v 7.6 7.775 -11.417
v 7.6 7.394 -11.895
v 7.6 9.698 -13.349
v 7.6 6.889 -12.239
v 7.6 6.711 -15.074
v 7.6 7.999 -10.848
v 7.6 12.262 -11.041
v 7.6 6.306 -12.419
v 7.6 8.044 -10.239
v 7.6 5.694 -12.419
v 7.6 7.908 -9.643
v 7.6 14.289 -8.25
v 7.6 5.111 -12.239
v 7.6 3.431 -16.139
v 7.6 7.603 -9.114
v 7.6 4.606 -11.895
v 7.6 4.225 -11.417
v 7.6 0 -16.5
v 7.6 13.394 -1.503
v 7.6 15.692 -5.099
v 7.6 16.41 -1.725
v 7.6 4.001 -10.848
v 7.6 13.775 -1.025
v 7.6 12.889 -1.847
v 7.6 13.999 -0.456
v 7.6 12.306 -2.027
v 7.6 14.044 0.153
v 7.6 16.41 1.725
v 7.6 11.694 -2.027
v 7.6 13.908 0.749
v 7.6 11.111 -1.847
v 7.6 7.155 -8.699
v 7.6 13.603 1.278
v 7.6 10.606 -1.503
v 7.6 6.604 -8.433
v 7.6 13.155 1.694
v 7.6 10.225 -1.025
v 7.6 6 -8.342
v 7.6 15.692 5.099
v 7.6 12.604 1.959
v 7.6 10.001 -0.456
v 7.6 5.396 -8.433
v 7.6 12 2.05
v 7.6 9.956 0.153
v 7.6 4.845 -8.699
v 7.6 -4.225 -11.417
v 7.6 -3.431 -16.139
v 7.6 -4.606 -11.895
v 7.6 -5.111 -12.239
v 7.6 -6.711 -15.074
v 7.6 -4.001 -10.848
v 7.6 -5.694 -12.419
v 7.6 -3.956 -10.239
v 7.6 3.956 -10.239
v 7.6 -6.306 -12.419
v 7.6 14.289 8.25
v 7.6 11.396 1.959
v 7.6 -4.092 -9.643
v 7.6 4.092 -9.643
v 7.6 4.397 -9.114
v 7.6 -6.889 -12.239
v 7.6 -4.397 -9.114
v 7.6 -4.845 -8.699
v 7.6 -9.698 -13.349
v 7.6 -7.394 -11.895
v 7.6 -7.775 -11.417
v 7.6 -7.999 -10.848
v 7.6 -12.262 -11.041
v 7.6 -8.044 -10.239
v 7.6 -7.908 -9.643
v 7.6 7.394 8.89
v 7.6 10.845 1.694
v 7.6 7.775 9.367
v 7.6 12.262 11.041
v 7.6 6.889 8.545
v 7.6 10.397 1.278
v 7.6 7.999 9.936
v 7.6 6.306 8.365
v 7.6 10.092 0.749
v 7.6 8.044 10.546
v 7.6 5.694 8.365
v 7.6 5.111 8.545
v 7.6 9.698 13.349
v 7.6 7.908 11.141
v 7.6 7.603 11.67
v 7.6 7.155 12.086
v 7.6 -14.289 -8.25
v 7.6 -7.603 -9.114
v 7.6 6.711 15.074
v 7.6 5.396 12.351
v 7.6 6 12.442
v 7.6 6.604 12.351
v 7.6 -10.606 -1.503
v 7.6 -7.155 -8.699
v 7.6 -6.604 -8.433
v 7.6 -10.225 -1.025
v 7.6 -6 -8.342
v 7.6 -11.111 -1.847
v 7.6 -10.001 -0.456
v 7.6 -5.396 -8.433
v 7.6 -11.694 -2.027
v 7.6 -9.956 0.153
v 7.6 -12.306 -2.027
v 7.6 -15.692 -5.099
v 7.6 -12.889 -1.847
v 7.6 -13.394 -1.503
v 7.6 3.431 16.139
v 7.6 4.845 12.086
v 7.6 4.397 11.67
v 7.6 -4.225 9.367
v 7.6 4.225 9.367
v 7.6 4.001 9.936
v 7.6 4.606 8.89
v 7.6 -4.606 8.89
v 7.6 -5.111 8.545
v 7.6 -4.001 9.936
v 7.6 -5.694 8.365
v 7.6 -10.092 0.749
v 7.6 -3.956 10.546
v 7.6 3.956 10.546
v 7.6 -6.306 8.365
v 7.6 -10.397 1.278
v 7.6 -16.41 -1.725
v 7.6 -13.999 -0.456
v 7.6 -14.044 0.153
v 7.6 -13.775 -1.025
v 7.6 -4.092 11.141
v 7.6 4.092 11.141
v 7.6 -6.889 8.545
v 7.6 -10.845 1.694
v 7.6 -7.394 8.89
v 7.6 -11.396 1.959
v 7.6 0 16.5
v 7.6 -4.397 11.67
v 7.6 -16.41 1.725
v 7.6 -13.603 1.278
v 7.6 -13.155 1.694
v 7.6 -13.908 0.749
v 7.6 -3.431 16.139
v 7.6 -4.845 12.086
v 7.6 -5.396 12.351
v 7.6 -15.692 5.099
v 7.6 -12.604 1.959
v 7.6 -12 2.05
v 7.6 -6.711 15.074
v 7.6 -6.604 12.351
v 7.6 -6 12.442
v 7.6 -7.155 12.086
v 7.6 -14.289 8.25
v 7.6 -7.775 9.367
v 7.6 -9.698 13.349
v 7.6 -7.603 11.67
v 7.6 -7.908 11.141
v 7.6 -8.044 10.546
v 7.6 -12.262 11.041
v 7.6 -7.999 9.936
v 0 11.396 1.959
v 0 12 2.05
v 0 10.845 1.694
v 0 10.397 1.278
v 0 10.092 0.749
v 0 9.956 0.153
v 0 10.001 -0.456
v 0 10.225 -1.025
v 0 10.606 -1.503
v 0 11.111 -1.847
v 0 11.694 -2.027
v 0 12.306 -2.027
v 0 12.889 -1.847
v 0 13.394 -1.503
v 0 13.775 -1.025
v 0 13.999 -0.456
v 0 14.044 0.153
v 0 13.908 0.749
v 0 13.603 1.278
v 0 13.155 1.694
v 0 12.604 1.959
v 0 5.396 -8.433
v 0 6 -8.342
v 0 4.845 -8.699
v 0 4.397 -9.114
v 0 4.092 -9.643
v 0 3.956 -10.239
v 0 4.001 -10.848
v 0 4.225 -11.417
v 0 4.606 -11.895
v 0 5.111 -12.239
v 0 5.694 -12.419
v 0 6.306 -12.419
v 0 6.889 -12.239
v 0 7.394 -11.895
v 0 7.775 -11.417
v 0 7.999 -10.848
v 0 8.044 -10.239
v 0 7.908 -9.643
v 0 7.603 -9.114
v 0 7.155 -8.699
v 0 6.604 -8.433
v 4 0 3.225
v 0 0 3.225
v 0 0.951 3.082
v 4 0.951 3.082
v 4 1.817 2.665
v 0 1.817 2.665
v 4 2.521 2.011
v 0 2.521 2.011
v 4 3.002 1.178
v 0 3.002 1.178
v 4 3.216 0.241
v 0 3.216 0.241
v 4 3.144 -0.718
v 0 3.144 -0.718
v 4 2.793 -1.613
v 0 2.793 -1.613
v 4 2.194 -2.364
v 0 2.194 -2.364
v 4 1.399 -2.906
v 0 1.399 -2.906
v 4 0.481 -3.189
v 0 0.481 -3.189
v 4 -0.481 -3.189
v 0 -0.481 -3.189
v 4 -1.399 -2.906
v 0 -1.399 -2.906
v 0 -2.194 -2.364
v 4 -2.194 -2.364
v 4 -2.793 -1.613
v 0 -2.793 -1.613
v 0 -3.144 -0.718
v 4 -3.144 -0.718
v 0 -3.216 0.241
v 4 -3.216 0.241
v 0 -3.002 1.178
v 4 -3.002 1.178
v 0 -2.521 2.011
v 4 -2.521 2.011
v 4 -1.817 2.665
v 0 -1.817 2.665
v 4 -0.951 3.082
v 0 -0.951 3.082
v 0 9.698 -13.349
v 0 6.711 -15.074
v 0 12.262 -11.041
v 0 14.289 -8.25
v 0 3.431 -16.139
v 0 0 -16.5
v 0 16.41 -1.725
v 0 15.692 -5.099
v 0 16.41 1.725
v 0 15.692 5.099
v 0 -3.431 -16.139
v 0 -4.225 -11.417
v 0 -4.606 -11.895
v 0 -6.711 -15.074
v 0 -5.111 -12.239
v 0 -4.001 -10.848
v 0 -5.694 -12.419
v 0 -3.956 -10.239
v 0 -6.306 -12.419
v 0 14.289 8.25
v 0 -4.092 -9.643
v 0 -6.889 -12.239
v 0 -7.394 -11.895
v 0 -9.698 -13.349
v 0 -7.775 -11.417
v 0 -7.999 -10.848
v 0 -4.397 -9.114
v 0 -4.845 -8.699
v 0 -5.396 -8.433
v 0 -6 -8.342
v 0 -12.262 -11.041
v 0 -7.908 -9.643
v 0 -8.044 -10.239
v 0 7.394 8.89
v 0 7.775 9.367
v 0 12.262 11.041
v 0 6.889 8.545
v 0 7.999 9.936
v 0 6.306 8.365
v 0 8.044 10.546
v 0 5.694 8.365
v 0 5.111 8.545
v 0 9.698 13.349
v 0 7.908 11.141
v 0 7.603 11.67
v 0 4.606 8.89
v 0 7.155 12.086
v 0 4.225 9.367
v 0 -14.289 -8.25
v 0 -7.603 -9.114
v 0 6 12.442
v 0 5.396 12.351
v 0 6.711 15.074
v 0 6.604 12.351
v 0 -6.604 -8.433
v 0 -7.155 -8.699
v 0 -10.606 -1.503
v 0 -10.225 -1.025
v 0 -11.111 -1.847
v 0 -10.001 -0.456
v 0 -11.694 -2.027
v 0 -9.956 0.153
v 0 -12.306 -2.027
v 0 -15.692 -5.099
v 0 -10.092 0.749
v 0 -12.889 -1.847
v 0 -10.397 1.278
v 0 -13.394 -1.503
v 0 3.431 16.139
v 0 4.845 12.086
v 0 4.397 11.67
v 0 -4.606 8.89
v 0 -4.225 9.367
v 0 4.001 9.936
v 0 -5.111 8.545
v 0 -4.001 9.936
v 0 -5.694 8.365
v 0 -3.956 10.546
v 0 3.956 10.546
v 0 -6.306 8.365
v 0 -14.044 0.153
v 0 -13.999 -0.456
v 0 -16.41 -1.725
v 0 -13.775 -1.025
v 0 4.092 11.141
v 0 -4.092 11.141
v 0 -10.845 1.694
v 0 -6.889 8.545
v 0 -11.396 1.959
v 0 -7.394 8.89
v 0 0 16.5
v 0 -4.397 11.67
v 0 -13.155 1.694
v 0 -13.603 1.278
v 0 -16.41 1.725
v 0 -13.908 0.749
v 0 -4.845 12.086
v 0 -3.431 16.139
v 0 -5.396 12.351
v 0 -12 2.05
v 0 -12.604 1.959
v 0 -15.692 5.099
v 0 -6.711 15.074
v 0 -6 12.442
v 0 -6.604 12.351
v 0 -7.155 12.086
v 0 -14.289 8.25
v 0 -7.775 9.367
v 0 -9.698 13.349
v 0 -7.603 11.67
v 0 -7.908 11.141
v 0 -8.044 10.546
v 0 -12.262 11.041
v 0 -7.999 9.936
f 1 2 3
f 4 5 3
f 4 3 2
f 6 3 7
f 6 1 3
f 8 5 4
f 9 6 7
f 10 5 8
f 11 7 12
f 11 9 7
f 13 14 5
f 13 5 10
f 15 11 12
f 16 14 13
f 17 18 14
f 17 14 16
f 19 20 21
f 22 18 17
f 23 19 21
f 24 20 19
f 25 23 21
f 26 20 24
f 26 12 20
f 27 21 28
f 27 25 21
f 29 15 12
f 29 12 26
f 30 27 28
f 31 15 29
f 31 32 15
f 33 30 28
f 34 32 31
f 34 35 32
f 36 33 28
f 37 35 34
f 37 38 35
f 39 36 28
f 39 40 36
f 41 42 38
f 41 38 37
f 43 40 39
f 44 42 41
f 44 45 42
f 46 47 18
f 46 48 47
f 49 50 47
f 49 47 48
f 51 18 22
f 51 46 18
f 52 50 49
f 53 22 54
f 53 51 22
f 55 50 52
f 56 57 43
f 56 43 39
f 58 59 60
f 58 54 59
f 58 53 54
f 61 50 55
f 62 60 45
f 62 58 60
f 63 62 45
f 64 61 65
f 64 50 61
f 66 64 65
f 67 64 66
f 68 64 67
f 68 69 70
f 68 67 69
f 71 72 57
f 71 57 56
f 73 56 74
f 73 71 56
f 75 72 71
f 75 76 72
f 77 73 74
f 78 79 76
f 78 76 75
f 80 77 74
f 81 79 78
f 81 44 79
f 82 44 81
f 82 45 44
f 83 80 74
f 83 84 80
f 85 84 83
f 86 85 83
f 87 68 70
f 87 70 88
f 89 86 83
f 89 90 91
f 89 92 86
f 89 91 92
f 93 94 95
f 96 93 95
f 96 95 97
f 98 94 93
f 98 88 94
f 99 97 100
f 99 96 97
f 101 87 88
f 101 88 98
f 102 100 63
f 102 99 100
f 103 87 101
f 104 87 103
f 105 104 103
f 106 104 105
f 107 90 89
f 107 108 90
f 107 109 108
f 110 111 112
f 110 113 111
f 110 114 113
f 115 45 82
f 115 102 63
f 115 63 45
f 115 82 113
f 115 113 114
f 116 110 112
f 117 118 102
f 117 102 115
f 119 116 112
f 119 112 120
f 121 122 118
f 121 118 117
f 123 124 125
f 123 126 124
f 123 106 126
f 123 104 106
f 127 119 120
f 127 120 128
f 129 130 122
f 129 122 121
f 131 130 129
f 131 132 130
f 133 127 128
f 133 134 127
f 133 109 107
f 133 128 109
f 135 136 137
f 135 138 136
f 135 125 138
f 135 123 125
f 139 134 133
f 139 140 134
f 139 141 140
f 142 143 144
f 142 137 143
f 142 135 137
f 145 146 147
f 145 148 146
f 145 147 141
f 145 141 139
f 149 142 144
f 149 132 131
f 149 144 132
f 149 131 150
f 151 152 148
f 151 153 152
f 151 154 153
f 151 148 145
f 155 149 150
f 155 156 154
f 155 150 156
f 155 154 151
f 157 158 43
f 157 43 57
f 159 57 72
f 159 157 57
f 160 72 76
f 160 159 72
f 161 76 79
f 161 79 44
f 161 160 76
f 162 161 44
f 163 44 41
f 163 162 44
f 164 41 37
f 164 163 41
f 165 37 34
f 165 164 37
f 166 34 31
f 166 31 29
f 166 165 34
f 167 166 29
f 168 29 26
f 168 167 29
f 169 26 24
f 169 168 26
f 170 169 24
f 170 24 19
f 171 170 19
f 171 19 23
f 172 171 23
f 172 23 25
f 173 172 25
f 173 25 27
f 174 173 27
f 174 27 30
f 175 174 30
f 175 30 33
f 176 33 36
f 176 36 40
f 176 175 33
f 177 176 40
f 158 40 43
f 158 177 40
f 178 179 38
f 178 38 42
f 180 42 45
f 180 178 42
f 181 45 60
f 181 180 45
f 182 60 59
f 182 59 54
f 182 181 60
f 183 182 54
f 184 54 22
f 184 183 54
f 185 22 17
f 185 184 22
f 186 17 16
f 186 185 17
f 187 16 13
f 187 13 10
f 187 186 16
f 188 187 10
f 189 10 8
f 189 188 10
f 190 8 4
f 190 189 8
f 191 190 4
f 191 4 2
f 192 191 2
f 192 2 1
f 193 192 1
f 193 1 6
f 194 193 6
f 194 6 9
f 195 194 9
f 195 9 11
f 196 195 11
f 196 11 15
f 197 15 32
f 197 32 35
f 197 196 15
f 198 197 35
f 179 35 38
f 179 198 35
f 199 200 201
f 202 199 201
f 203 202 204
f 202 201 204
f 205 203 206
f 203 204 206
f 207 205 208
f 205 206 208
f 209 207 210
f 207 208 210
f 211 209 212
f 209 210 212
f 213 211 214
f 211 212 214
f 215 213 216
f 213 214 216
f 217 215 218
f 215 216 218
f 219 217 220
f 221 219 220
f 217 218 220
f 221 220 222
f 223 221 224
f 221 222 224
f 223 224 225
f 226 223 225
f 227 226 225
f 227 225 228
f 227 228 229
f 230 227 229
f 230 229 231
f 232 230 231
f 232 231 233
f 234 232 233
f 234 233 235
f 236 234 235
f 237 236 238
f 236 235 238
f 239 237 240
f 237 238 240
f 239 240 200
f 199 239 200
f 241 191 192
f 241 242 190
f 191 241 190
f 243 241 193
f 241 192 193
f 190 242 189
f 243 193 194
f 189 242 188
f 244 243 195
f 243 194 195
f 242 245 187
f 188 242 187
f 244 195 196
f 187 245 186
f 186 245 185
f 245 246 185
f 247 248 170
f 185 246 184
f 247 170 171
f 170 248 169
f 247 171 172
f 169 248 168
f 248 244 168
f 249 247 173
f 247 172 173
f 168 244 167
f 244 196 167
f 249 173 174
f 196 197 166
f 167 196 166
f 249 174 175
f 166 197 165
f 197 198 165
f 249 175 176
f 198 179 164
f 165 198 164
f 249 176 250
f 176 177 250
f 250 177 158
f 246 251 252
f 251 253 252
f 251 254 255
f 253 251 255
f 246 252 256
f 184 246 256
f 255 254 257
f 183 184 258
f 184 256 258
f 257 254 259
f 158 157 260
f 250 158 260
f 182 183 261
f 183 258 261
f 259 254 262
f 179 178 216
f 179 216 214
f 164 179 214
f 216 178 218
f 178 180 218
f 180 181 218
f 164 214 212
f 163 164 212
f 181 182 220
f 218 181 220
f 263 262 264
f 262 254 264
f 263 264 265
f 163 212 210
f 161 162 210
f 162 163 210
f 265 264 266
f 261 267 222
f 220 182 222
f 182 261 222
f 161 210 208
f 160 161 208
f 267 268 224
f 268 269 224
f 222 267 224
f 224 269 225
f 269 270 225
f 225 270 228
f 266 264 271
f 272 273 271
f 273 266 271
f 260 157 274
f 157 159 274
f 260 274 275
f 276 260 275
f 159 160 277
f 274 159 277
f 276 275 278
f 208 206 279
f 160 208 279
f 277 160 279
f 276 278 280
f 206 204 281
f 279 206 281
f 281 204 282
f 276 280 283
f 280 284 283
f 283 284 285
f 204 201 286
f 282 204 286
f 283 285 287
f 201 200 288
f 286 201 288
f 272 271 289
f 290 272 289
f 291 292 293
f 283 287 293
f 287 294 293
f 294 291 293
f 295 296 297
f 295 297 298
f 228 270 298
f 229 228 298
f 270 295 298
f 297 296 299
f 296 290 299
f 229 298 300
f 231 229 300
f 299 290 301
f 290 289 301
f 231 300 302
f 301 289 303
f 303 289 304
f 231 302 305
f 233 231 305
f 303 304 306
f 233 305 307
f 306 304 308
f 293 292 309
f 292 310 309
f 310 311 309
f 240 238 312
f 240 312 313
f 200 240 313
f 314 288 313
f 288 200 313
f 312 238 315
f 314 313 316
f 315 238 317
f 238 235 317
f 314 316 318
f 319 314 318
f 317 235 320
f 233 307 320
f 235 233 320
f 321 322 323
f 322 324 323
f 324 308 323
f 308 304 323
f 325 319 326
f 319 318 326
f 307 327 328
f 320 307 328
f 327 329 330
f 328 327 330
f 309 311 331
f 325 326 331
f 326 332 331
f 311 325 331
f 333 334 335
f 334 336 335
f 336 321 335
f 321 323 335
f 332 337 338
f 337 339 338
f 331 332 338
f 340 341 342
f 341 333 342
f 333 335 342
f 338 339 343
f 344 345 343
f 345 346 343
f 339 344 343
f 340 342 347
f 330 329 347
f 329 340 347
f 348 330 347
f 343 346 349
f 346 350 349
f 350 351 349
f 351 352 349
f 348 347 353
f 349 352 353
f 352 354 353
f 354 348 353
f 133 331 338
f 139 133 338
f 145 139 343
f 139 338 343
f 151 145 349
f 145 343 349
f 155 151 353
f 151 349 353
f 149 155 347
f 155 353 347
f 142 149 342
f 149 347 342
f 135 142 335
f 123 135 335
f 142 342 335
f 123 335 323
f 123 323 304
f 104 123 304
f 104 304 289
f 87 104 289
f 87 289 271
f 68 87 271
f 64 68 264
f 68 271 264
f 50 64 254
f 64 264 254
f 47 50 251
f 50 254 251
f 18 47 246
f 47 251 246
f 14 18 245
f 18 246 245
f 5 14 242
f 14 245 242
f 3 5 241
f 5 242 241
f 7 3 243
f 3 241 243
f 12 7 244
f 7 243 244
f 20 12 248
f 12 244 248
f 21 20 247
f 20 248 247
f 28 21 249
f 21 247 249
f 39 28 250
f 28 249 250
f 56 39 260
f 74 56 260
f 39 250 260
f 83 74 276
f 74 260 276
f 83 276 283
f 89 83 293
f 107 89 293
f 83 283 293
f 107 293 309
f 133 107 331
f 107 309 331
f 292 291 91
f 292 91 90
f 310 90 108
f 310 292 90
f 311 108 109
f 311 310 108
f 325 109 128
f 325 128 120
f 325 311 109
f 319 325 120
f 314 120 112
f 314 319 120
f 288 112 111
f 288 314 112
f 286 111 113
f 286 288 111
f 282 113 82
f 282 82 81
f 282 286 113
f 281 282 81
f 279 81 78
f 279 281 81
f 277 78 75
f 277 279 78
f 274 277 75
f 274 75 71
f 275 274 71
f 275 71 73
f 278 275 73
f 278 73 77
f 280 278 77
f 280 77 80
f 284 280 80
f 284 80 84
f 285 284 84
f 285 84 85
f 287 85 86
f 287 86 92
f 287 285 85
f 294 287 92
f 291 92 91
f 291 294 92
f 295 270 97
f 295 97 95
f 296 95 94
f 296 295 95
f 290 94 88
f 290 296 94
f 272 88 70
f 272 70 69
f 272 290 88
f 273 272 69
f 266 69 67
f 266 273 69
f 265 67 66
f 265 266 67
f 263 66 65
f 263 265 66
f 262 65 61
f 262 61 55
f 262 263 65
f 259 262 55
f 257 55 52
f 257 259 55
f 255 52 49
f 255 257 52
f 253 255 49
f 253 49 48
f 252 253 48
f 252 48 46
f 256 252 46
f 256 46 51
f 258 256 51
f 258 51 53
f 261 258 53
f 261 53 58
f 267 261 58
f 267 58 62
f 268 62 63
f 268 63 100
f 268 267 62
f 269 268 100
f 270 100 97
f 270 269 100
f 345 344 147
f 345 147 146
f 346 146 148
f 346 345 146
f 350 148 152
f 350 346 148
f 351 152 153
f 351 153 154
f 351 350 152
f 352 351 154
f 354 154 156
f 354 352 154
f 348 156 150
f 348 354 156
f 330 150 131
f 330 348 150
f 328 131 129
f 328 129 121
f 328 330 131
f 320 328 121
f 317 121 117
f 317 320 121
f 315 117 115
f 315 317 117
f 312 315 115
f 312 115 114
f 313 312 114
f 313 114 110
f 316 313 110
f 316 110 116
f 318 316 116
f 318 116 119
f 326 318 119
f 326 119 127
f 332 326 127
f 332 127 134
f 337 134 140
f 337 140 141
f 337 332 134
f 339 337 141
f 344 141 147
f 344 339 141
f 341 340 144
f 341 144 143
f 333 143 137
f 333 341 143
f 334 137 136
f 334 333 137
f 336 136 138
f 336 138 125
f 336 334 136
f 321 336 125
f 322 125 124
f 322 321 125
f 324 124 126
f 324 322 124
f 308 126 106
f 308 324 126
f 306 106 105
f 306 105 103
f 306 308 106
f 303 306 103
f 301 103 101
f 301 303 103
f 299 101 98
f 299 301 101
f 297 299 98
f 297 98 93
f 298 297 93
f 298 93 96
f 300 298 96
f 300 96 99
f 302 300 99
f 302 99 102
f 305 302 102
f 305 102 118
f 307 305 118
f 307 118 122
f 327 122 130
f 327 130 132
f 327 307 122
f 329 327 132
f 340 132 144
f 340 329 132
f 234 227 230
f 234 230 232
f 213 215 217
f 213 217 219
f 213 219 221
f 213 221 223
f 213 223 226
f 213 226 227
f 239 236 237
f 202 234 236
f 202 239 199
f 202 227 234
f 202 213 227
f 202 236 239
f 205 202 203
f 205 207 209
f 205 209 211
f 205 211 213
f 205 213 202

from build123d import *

# Parameters (mm, degrees)
SKETCH_1_R          = 16.5
SKETCH_1_R_2        = 2.05
EXTRUDE_1_DEPTH     = 7.6
SKETCH_2_R          = 3.225
CUT_EXTRUDE_1_DEPTH = 4


with BuildPart() as part:
    # 草图1 → 凸台-拉伸1 (new body)
    with BuildSketch(Plane(origin=(0, 0, 0), x_dir=(0, 0, -1), z_dir=(1, 0, 0))):
        with Locations(Location((0, 0, 0), (0, 0, 180))):
            Circle(SKETCH_1_R)
        with Locations(Location((0, 12, 0), (0, 0, 180))):
            Circle(SKETCH_1_R_2, mode=Mode.SUBTRACT)
        with Locations(Location((10.392304845, 6, 0), (0, 0, 180))):
            Circle(SKETCH_1_R_2, mode=Mode.SUBTRACT)
        with Locations(Location((10.392304845, -6, 0), (0, 0, 180))):
            Circle(SKETCH_1_R_2, mode=Mode.SUBTRACT)
        with Locations(Location((0, -12, 0), (0, 0, 180))):
            Circle(SKETCH_1_R_2, mode=Mode.SUBTRACT)
        with Locations(Location((-10.392304845, -6, 0), (0, 0, 180))):
            Circle(SKETCH_1_R_2, mode=Mode.SUBTRACT)
        with Locations(Location((-10.392304845, 6, 0), (0, 0, 180))):
            Circle(SKETCH_1_R_2, mode=Mode.SUBTRACT)
    extrude(amount=EXTRUDE_1_DEPTH)

    # 草图2 → 切除-拉伸1 (cut)
    with BuildSketch(Plane.ZY):
        Circle(SKETCH_2_R)
    extrude(amount=-CUT_EXTRUDE_1_DEPTH, mode=Mode.SUBTRACT)


solid = part.part
